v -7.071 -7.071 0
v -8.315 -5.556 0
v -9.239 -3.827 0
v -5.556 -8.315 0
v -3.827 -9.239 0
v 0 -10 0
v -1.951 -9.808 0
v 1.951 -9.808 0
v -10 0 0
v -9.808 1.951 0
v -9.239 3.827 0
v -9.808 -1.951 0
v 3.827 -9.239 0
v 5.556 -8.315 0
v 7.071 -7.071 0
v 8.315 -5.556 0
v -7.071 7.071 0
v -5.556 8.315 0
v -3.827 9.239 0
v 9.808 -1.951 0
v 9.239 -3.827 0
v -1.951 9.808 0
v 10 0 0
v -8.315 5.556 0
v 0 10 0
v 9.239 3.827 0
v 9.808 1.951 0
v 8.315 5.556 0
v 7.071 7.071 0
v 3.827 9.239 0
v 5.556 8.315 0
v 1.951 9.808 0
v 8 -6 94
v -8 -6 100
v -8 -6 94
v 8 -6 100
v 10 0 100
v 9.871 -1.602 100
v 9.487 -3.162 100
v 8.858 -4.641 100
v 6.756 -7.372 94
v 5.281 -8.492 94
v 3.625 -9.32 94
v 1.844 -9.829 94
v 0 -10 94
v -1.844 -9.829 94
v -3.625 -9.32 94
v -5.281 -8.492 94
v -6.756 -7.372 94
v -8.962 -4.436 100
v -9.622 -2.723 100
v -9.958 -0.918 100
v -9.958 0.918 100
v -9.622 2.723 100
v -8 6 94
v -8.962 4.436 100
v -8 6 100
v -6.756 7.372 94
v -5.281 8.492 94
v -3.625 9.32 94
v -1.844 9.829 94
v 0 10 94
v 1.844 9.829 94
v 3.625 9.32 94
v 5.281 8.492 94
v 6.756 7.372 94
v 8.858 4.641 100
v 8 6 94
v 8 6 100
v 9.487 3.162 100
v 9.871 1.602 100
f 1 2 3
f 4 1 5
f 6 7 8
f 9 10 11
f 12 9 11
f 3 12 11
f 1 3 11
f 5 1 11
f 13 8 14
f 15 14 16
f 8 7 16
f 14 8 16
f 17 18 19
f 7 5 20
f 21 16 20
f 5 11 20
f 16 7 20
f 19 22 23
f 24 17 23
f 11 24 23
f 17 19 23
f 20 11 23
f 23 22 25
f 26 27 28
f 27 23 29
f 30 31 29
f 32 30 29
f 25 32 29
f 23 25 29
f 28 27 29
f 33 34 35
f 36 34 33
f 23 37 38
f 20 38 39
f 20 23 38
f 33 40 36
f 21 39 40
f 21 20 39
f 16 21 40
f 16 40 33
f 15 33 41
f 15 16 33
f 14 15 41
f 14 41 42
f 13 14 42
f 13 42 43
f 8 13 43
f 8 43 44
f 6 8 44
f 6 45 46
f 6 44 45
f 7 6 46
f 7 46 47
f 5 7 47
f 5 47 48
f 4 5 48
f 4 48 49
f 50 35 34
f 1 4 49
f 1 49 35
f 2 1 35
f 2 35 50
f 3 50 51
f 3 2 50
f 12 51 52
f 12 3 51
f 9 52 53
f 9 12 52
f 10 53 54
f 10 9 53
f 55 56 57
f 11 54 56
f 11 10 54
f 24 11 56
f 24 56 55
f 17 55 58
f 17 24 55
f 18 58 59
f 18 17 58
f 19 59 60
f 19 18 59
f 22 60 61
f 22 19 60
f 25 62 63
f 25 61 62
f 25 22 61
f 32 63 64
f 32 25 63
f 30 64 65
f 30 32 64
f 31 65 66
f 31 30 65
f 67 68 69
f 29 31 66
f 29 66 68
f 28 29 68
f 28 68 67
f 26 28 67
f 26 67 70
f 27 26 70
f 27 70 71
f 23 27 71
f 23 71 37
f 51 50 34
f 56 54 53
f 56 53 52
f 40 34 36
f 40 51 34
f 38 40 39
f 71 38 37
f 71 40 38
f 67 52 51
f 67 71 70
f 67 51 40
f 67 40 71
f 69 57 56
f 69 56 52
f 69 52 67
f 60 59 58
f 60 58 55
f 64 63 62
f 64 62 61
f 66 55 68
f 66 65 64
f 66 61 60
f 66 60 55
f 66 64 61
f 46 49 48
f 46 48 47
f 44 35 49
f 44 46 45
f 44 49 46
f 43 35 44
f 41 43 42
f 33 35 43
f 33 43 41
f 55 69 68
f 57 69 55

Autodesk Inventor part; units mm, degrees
ref_plane "YZ Plane" through (0, 0, 0) normal (1, 0, 0) x (0, 1, 0)
ref_plane "XZ Plane" through (0, 0, 0) normal (0, 1, 0) x (-1, 0, 0)
ref_plane "XY Plane" through (0, 0, 0) normal (0, 0, 1) x (1, 0, 0)
sketch "Эскиз1" plane through (0, 0, 0) normal (0, 0, 1) x (1, 0, 0)
  circle A0 centre (0, 0) radius 10
  dimension "d0" = 20
extrude "Выдавливание1" add sketch "Эскиз1" along normal blind 100
sketch "Эскиз2" plane through (0, 0, 100) normal (0, 0, 1) x (1, 0, 0)
  circle A0 centre (0, 0) radius 10 projected
  line L0 (8, 6) -> (-8, 6)
  line L1 (-8, -6) -> (8, -6)
  dimension "d3" = 12
extrude "Выдавливание2" cut sketch "Эскиз2" against normal blind 6 contours L0 A0 | A0 L1
equation "\"d0\" = d_main_shaft"
equation "\"d3\" = width_flattened_surface"
equation "\"d4\" = 2 * thickness_steel"
equation "\"d_main_shaft\" = 20"
equation "\"tolerance_plazma\" = 0.1"
equation "\"thickness_steel\" = 3"
equation "\"d_main_screw_holes\" = 6.1"
equation "\"thickness_profile_tibea\" = 3"
equation "\"thickness_profile_femur\" = 3"
equation "\"width_flattened_surface\" = 12"
equation "\"width_shaft_shift\" = 35"
equation "\"hight_shaft_shift\" = 37"
properties part number "shaft_tibea" material "Сталь"
